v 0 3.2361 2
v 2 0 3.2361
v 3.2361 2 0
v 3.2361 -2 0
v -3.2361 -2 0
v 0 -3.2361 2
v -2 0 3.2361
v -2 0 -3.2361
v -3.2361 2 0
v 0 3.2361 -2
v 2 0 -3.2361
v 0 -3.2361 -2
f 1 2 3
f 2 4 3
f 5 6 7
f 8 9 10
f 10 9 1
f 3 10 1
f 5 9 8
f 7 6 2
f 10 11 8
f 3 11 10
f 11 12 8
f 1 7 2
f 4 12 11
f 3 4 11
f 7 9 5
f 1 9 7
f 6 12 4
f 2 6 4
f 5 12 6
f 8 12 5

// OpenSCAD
module myIcosahedron (x) {
    phi = (1 + sqrt (5)) / 2;
    scale ([x, x, x]) {
	hull () {
	    polyhedron (
		points = [
		    [phi, 1, 0],
		    [0, phi, 1],
		    [1, 0, phi]
		],
		faces = [
		    [0, 1, 2]
		]);

	    polyhedron (
		points = [
		    [-phi, 1, 0],
		    [0, -phi, 1],
		    [1, 0, -phi]
		],
		faces = [
		    [0, 1, 2]
		]);

	    polyhedron (
		points = [
		    [phi, -1, 0],
		    [0, phi, -1],
		    [-1, 0, phi],
		],
		faces = [
		    [0, 1, 2]
		]);

	    polyhedron (
		points = [
		    [-phi, -1, 0],
		    [0, -phi, -1],
		    [-1, 0, -phi]
		],
		faces = [
		    [0, 1, 2]
		]);
	};
    }
}

myIcosahedron (2);
